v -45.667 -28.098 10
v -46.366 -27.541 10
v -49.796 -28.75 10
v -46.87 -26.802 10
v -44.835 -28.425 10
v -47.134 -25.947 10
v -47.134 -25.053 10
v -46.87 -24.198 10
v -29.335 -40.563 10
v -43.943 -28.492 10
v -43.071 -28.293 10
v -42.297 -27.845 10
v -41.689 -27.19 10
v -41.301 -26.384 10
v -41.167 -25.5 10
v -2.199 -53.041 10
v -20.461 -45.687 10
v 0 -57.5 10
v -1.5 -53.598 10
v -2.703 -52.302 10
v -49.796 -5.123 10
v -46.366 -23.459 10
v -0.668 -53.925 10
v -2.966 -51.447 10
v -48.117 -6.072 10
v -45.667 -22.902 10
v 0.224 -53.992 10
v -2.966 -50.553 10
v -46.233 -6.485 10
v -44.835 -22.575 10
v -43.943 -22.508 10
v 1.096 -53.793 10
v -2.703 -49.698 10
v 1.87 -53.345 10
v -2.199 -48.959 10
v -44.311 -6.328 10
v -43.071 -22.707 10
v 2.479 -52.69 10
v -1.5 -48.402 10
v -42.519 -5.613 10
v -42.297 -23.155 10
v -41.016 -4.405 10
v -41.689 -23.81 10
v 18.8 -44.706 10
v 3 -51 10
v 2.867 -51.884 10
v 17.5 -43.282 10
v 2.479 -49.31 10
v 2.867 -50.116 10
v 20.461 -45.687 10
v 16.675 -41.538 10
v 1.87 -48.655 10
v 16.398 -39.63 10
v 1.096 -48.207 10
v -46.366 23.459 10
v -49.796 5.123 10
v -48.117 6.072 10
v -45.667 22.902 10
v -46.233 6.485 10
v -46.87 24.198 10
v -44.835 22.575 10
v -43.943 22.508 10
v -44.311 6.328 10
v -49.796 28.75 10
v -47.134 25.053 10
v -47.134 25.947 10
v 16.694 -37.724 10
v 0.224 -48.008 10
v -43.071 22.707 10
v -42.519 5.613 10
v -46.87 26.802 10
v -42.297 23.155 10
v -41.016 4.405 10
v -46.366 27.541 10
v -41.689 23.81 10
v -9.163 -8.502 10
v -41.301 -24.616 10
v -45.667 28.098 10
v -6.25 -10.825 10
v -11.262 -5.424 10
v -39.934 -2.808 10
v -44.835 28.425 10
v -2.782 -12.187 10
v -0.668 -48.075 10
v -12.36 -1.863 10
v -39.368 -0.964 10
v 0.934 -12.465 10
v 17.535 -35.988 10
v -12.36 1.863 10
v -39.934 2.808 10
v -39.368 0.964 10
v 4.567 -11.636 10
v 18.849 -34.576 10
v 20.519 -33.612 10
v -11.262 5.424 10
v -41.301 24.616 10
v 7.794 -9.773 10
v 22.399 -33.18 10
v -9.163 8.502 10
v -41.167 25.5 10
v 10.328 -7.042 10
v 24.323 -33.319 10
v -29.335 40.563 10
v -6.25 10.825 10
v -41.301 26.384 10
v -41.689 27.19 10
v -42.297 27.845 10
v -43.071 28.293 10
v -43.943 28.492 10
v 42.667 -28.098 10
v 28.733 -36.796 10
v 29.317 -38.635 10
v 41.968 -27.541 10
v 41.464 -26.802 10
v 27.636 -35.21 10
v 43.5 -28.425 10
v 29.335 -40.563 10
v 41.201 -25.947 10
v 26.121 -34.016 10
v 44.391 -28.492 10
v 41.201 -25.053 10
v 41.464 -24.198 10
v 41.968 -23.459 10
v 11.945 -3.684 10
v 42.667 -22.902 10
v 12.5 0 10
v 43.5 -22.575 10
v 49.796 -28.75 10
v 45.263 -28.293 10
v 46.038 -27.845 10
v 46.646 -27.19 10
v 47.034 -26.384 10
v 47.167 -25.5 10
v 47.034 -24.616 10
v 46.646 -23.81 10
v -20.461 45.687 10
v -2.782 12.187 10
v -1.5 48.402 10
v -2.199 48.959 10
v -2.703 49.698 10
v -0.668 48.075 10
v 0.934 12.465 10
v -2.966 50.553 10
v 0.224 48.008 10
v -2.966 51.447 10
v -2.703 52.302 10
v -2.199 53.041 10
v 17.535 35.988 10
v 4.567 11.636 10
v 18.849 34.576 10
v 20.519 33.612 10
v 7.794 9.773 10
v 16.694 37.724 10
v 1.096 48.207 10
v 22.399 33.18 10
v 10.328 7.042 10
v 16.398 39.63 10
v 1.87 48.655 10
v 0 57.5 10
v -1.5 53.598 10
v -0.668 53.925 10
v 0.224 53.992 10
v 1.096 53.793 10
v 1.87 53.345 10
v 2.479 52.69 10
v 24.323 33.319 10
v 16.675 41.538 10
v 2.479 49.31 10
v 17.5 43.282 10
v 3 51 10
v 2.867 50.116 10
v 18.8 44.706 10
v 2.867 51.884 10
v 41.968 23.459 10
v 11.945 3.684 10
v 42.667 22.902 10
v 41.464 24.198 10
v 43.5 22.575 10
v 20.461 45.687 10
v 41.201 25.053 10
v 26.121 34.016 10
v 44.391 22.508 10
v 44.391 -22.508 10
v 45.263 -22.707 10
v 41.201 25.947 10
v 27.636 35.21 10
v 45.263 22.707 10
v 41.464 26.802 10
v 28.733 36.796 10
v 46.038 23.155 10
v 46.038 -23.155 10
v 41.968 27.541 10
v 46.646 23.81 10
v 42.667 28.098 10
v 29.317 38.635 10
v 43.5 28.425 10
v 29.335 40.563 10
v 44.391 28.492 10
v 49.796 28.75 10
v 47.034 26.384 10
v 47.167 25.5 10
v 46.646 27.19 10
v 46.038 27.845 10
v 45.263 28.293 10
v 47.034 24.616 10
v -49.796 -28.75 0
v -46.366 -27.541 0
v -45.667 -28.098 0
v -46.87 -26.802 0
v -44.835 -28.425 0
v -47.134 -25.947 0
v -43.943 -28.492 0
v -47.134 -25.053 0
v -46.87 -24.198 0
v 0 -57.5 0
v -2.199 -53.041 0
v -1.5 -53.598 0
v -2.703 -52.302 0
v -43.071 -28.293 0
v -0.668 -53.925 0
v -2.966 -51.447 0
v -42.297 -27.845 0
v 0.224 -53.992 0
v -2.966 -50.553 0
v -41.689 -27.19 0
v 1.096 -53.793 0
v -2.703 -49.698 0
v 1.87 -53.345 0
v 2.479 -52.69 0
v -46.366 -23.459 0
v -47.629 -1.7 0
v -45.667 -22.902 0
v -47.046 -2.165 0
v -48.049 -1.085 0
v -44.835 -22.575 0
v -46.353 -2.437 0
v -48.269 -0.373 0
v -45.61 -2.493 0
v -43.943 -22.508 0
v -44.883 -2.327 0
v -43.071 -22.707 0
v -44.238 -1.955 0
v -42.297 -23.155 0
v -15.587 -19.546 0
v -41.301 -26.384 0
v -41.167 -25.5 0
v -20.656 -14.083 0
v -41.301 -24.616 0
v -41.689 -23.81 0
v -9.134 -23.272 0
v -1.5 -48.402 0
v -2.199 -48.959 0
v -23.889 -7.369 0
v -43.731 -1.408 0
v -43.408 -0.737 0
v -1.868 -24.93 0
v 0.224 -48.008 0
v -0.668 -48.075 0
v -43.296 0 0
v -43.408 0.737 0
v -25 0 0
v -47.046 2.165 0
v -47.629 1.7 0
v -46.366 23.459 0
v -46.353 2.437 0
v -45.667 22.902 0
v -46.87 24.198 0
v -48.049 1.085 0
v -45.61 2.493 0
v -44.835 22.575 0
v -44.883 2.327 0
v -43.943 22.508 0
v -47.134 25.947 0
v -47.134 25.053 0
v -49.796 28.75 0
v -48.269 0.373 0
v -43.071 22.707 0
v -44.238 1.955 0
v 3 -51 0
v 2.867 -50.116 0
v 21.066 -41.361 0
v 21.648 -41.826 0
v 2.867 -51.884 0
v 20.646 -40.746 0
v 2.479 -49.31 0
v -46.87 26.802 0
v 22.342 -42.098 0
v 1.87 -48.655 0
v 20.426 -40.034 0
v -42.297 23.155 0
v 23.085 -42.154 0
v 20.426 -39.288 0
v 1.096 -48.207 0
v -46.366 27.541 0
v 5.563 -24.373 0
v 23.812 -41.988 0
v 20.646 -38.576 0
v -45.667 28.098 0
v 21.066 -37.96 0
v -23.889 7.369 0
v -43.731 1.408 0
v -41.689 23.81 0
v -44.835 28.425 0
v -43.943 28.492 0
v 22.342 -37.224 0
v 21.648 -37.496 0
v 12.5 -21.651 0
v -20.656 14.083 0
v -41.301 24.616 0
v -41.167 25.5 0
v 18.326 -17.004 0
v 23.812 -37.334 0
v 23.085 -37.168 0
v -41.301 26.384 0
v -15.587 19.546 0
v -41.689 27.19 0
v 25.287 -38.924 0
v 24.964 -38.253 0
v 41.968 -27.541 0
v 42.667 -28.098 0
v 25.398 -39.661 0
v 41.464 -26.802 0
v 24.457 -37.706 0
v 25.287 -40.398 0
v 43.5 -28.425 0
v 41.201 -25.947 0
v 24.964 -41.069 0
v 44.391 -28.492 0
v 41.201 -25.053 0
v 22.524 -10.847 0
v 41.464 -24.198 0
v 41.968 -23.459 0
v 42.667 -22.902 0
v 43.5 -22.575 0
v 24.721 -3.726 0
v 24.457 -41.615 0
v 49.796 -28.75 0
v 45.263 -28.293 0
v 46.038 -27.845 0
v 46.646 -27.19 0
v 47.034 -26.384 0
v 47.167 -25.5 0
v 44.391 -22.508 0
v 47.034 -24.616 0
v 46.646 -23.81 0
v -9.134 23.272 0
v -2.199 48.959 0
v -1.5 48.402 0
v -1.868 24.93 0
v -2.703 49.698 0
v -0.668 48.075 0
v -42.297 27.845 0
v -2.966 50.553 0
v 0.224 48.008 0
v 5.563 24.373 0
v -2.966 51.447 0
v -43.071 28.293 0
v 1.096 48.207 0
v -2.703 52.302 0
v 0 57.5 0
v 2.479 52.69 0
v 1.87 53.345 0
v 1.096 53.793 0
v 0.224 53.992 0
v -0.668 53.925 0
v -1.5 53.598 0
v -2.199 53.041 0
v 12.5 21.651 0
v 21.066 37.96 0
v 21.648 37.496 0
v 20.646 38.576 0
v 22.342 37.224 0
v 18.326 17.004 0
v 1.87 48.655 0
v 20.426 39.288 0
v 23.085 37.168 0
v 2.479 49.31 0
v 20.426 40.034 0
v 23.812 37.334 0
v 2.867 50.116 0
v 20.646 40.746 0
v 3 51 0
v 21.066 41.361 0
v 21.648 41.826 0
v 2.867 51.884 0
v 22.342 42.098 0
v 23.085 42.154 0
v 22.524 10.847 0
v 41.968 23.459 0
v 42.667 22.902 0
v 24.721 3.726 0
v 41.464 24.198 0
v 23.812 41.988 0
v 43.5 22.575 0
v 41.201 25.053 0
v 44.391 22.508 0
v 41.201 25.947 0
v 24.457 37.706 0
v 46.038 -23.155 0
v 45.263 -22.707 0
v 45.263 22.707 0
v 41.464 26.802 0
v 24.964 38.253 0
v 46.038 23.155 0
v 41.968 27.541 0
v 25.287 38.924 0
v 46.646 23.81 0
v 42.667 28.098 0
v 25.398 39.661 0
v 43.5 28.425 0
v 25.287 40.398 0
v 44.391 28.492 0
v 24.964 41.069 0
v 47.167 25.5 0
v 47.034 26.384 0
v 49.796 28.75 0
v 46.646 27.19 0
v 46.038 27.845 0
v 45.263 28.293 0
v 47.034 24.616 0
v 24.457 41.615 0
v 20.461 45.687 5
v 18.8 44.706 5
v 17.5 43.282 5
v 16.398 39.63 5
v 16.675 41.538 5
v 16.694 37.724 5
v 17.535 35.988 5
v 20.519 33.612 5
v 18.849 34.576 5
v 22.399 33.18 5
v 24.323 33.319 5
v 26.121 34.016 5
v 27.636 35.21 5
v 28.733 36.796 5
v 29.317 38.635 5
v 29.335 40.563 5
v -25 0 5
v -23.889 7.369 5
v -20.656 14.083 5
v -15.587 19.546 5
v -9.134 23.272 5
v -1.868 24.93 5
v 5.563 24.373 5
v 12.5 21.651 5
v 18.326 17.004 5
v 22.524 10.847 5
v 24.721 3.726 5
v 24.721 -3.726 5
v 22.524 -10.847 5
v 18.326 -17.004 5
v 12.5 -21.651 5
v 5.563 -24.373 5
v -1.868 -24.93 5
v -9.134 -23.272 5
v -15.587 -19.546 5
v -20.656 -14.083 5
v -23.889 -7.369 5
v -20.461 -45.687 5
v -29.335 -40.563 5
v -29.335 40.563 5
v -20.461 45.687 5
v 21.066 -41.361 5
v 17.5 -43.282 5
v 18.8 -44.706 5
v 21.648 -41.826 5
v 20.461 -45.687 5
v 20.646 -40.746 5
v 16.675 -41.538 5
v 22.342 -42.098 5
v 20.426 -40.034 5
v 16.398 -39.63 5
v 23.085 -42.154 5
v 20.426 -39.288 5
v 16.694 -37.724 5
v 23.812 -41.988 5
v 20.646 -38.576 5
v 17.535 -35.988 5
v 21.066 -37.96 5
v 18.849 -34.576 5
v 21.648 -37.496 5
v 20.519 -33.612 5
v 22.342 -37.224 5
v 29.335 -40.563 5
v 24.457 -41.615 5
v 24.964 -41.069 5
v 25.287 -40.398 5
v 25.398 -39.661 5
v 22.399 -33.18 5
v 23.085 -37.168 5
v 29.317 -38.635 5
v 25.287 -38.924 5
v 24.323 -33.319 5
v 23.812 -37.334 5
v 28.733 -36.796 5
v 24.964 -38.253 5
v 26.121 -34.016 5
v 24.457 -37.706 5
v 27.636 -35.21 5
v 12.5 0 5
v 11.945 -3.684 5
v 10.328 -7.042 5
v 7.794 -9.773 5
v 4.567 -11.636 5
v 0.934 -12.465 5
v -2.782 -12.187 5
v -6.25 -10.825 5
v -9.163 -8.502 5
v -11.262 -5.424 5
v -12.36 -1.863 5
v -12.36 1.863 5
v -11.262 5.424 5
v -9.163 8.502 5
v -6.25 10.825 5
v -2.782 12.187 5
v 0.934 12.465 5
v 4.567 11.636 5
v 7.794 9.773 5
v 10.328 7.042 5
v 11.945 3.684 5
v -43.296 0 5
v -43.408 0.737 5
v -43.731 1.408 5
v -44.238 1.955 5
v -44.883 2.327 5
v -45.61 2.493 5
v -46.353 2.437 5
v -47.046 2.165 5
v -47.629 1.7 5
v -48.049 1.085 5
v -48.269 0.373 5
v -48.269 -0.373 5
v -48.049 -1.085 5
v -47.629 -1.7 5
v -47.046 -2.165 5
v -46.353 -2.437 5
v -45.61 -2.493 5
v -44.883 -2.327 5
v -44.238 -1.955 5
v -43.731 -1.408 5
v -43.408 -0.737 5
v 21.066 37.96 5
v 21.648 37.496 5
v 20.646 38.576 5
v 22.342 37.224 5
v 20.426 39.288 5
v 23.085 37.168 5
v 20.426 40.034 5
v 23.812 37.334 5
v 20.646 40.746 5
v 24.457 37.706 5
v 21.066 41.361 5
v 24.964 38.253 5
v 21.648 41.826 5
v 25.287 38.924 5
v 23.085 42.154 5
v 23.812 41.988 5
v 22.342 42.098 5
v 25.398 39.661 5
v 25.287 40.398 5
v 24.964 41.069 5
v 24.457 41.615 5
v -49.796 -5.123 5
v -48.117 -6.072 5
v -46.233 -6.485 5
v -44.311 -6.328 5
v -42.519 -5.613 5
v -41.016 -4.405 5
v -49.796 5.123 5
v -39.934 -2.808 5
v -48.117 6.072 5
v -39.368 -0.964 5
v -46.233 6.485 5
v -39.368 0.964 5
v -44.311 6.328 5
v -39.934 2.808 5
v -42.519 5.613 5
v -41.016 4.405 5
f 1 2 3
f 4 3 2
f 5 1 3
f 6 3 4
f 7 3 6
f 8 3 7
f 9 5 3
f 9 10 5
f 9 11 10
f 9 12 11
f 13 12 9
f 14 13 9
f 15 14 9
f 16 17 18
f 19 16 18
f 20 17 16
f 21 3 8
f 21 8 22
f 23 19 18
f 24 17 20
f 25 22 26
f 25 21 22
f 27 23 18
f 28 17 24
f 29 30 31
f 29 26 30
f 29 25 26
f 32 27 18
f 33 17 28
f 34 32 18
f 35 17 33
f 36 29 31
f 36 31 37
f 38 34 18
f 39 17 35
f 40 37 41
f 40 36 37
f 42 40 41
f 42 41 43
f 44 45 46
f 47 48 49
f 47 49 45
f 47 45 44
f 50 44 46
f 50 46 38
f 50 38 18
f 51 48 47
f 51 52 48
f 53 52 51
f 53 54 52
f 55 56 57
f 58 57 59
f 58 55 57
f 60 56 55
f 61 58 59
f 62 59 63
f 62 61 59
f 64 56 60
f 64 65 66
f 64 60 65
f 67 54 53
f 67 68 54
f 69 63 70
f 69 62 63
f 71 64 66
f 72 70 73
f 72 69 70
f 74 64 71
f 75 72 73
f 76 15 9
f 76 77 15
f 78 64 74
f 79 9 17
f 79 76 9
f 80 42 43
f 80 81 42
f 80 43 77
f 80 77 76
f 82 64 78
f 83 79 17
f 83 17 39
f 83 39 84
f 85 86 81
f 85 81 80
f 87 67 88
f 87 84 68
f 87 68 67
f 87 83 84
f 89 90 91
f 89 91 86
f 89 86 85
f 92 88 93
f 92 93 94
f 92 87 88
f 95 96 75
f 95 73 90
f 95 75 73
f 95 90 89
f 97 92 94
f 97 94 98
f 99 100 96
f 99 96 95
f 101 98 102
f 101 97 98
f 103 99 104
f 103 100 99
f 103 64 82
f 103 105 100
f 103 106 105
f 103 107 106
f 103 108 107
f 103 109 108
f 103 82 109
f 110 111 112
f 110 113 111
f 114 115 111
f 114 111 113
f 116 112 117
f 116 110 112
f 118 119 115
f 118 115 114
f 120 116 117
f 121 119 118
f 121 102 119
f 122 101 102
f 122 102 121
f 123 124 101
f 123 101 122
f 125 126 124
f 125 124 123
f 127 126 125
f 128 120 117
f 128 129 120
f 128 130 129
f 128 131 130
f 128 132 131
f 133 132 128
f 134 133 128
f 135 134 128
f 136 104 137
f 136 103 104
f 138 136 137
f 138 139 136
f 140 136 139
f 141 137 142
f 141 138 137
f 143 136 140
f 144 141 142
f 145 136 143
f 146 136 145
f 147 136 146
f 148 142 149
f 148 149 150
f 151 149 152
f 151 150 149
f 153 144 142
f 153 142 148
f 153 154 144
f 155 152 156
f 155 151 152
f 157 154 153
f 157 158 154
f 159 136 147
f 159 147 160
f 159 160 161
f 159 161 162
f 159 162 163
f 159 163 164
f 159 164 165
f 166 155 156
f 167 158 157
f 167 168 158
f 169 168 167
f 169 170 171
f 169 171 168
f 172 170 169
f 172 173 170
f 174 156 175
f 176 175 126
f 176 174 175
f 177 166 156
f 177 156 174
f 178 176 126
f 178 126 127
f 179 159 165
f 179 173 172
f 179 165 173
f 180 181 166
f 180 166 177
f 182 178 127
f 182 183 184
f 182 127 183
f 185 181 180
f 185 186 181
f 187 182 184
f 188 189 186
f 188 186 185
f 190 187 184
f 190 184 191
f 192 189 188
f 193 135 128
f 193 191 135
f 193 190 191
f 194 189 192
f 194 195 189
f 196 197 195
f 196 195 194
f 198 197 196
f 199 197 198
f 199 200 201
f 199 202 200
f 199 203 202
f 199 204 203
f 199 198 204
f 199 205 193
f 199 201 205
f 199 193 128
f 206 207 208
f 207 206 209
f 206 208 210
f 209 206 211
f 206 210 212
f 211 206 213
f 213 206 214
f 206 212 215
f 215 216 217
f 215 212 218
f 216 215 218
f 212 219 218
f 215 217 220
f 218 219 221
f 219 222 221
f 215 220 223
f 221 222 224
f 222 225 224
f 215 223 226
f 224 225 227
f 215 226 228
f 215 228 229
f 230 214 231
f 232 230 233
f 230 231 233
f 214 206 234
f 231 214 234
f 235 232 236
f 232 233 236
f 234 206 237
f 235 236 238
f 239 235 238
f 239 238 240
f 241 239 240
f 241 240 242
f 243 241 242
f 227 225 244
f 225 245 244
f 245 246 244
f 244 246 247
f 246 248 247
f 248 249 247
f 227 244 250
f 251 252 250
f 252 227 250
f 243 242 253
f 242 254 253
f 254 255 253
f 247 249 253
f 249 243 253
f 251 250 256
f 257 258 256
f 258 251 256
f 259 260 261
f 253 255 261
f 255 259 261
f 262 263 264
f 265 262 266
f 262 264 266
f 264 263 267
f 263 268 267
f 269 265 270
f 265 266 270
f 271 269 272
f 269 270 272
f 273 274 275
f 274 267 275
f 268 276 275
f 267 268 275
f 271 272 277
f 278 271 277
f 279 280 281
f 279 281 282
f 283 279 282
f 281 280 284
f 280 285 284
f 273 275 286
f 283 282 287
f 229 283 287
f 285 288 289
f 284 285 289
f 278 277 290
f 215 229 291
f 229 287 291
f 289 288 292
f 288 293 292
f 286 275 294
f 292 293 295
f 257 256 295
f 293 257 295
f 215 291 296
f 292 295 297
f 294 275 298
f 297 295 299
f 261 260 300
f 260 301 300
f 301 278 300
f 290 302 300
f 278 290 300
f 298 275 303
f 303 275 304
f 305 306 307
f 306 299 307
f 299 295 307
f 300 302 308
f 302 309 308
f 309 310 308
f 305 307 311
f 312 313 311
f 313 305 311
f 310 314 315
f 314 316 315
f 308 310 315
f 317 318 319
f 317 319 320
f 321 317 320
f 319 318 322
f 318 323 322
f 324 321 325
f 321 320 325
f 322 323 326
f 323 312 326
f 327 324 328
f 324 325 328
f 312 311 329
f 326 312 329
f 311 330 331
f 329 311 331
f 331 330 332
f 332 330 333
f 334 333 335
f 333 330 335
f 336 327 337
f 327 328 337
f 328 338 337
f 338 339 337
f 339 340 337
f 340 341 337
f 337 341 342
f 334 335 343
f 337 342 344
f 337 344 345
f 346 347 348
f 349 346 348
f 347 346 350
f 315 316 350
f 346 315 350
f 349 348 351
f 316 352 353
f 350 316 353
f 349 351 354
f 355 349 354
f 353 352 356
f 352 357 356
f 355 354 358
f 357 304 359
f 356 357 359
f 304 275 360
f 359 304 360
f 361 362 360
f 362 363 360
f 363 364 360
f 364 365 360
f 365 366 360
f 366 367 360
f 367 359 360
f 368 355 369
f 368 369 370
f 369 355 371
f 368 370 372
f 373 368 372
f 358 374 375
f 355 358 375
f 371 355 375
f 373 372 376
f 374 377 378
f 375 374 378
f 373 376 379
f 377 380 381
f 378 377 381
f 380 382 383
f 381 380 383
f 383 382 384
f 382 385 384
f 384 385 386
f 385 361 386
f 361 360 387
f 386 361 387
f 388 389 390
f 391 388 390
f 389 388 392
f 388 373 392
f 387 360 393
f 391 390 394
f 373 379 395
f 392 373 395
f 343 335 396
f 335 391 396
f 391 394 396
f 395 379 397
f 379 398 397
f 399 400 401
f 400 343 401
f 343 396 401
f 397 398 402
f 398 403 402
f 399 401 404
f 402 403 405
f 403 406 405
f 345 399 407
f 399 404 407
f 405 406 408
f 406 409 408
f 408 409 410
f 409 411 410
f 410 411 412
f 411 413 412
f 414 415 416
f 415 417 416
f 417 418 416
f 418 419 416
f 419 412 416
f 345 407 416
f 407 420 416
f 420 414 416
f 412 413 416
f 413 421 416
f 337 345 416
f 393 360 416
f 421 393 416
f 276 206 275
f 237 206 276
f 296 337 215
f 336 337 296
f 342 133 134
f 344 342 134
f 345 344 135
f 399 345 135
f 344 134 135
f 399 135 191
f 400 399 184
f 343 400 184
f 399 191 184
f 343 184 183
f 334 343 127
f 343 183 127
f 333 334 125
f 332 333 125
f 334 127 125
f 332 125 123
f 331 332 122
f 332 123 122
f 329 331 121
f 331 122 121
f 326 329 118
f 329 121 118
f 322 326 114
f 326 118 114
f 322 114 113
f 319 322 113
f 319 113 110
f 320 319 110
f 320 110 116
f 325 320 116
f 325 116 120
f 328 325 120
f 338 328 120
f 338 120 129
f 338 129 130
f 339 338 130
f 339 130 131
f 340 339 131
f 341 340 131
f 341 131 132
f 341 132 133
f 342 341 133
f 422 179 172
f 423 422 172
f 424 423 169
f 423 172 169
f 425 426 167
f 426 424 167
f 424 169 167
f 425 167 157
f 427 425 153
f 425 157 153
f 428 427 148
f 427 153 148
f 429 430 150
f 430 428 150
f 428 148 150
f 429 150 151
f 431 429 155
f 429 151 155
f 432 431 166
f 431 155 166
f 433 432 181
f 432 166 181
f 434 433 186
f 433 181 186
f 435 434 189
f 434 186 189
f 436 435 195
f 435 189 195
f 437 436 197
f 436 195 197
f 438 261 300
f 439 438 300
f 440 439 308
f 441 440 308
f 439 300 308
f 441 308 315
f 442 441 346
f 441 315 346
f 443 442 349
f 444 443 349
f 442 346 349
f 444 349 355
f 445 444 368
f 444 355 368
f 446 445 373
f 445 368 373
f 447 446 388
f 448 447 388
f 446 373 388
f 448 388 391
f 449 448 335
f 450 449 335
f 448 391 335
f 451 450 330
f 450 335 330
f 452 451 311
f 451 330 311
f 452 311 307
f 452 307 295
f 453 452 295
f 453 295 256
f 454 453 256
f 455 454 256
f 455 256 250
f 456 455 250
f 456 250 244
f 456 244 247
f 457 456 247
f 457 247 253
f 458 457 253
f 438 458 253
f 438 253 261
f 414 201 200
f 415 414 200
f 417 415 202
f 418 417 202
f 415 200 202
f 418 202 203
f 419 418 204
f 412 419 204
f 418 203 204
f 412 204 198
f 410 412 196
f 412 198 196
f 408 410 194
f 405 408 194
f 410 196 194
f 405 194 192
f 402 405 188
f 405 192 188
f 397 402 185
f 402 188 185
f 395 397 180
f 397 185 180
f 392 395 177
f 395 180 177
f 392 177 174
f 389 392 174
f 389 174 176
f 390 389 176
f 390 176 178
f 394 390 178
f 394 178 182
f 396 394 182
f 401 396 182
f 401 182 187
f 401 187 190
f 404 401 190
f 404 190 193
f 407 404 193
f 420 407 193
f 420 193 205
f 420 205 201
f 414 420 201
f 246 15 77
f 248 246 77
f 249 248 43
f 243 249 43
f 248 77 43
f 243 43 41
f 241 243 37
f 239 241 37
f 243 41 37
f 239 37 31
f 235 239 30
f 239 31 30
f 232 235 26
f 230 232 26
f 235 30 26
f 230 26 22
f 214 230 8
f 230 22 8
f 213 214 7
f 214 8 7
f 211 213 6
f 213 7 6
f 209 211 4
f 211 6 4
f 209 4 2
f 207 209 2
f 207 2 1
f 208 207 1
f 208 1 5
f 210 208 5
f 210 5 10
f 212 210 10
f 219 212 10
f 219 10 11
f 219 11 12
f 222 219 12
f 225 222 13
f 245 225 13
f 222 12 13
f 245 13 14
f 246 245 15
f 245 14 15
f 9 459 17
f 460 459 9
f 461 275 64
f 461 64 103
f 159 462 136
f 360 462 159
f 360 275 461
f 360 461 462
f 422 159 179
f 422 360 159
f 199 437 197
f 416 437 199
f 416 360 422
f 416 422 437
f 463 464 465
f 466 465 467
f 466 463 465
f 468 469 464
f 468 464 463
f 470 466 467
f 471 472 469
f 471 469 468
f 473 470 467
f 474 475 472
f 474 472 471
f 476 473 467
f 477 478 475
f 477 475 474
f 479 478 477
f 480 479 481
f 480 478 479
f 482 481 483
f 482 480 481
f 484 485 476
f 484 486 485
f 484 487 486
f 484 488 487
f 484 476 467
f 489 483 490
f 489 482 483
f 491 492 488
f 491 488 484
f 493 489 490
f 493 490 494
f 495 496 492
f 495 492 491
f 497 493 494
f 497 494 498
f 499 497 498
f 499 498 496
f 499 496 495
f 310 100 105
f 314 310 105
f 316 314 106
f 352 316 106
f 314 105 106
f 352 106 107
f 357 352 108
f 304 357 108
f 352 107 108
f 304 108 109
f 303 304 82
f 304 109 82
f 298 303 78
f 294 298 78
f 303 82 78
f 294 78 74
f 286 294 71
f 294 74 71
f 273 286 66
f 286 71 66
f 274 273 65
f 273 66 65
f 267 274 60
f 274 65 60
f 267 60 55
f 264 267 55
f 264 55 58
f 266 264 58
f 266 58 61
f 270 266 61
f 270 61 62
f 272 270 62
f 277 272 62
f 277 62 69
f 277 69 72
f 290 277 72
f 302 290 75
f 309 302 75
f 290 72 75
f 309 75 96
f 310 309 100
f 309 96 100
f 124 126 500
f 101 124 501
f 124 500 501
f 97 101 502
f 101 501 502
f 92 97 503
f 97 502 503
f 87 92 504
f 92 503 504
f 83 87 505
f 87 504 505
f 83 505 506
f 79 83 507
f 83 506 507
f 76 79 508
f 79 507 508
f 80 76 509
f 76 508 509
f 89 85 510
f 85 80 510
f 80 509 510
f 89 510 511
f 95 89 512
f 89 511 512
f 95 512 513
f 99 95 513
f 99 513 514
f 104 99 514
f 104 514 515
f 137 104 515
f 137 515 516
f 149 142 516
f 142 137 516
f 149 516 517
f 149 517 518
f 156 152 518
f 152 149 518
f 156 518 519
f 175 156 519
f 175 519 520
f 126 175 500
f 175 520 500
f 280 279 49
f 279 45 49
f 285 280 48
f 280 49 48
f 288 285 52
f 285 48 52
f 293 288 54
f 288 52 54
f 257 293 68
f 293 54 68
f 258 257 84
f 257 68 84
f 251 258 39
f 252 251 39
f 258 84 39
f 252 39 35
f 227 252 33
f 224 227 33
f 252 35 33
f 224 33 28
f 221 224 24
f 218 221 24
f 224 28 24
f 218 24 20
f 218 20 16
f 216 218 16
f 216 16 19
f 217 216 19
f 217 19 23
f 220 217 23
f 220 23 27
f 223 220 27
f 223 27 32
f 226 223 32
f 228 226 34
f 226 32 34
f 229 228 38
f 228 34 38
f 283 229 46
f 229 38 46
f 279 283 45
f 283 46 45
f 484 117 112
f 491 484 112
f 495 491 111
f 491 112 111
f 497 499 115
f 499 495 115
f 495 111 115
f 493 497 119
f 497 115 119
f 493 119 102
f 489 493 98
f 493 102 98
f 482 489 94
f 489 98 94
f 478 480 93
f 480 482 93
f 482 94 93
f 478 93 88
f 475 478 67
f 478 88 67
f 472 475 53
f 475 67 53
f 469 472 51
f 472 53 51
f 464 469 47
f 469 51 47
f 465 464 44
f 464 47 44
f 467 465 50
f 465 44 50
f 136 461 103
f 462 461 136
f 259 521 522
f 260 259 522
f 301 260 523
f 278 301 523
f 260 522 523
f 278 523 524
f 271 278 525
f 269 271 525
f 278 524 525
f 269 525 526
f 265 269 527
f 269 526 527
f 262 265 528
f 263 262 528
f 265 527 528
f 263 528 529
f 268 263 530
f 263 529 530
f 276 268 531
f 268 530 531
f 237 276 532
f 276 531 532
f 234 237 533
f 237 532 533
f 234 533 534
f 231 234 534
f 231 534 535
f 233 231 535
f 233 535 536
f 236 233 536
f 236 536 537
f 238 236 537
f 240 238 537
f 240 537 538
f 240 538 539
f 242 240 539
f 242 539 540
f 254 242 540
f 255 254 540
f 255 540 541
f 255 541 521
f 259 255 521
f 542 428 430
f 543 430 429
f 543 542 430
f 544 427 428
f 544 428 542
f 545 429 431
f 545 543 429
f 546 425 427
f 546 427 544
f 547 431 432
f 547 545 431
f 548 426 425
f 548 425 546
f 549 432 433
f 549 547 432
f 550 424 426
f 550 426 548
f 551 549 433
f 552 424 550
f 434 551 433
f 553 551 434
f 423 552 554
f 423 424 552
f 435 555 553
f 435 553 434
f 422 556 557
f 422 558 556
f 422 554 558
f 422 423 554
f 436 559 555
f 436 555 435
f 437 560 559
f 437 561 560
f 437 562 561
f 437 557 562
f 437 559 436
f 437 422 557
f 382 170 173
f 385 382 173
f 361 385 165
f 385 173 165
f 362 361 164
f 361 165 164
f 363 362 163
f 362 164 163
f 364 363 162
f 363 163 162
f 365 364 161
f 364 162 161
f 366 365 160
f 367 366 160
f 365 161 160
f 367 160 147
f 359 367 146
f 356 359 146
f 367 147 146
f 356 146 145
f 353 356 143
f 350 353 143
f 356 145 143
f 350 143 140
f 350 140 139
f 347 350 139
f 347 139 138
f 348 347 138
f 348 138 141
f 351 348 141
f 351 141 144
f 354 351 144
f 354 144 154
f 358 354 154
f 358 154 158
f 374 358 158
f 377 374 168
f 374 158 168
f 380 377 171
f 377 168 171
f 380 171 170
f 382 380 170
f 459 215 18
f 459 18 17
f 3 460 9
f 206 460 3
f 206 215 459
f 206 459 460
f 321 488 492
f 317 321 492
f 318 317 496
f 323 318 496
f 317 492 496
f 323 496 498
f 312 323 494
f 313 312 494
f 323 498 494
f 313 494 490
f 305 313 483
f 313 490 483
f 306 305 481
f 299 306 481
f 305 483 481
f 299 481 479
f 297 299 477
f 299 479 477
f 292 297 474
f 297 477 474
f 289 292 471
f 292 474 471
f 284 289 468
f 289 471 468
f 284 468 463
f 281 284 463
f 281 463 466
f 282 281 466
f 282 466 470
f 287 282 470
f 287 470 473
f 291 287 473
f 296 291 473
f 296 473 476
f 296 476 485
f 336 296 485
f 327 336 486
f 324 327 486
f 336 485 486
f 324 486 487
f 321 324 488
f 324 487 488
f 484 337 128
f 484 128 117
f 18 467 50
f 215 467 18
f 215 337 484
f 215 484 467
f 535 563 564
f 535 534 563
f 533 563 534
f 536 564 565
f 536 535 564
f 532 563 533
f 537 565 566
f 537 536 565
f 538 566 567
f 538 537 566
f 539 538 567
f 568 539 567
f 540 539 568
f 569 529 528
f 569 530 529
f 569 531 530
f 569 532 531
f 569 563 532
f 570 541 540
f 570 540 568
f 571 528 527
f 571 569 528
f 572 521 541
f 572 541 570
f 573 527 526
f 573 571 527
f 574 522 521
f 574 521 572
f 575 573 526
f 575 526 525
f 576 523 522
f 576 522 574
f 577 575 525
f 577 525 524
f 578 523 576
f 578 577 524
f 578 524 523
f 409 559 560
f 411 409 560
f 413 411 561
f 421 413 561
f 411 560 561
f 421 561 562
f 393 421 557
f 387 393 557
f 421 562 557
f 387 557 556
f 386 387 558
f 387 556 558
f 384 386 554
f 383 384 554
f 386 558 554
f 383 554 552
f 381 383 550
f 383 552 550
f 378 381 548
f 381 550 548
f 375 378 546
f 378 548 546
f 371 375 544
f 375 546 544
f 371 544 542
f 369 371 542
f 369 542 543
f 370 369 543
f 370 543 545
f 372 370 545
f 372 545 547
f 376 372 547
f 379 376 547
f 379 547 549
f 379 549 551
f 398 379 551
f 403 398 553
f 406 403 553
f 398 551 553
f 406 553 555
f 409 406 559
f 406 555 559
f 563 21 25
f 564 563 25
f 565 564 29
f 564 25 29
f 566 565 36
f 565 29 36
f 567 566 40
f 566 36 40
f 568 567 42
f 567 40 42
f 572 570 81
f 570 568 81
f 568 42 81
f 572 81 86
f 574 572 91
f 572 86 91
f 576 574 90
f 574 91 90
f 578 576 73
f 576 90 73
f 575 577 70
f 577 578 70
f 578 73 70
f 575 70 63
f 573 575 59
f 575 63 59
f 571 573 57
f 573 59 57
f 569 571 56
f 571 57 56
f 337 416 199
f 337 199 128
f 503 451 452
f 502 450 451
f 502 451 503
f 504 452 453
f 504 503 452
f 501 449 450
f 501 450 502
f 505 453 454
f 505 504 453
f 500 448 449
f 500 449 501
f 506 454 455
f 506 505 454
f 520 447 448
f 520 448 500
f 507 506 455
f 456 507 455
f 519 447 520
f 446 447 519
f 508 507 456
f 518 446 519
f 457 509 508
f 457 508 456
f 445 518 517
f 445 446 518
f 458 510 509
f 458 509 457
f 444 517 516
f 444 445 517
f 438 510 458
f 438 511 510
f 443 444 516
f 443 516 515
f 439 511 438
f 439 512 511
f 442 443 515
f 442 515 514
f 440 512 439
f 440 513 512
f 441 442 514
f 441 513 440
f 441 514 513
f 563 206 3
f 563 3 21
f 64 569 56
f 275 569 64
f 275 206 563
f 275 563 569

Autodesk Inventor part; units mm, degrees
ref_plane "YZ Plane" through (0, 0, 0) normal (1, 0, 0) x (0, 1, 0)
ref_plane "XZ Plane" through (0, 0, 0) normal (0, 1, 0) x (-1, 0, 0)
ref_plane "XY Plane" through (0, 0, 0) normal (0, 0, 1) x (1, 0, 0)
sketch "Sketch1" plane through (0, 0, 0) normal (0, 0, 1) x (1, 0, 0)
  circle A0 centre (0, 0) radius 12.5
  circle A1 centre (-30, 0) radius 3
  circle A2 centre (-15, -25.9808) radius 3
  circle A3 centre (15, -25.9808) radius 3
  circle A4 centre (30, 0) radius 3
  circle A5 centre (15, 25.9808) radius 3
  circle A6 centre (-15, 25.9808) radius 3
  line L0 (0, 57.5) -> (49.7965, 28.75)
  line L1 (49.7965, 28.75) -> (49.7965, -28.75)
  line L2 (49.7965, -28.75) -> (0, -57.5)
  line L3 (0, -57.5) -> (-49.7965, -28.75)
  line L4 (-49.7965, -28.75) -> (-49.7965, 28.75)
  line L5 (-49.7965, 28.75) -> (0, 57.5)
  point P0 (49.7965, 0)
  dimension "d0" = 25
  dimension "d2" = 6
  dimension "d6" = 360
  dimension "d15" = 30
  dimension "d33" = 115
extrude "Extrusion1" add sketch "Sketch1" along normal blind 10 contours A1 | A2 | A3 | A4 | A5 | A6 | L0 L1 L2 L3 L4 L5
sketch "Sketch7" plane through (0, 0, 10) normal (0, 0, 1) x (1, 0, 0)
  circle A0 centre (0, 51) radius 3
  circle A1 centre (-44.1673, 25.5) radius 3
  circle A2 centre (-44.1673, -25.5) radius 3
  circle A3 centre (0, -51) radius 3
  circle A4 centre (44.1673, -25.5) radius 3
  circle A5 centre (44.1673, 25.5) radius 3
  line L0 (0, 51) -> (0, -51)
  point P0 (0, 0)
  dimension "d42" = 6
  dimension "d46" = 360
  dimension "d96" = 102
extrude "Extrusion6" cut sketch "Sketch7" against normal through all
sketch "Sketch9" plane through (0, 0, 0) normal (0, 0, -1) x (-1, 0, 0)
  circle A0 centre (0, 0) radius 25
  dimension "d56" = 50
extrude "Extrusion8" cut sketch "Sketch9" against normal blind 5
sketch "Sketch14" plane through (0, 0, 10) normal (0, 0, 1) x (1, 0, 0)
  circle A0 centre (-45.7965, 0) radius 2.5
  circle A1 centre (-22.8982, -39.6609) radius 2.5
  circle A2 centre (22.8982, -39.6609) radius 2.5
  circle A3 centre (45.7965, 0) radius 2.5
  circle A4 centre (22.8982, 39.6609) radius 2.5
  circle A5 centre (-22.8982, 39.6609) radius 2.5
  line L0 (-49.7965, 28.75) -> (-49.7965, -28.75) projected
  point P0 (0, 0)
  point P1 (-45.7965, 0)
  dimension "d81" = 5
  dimension "d85" = 360
  dimension "d97" = 4
extrude "Extrusion13" cut sketch "Sketch14" against normal through all
sketch "Sketch15" plane through (0, 0, 10) normal (0, 0, 1) x (1, 0, 0)
  circle A0 centre (-22.8982, 39.6609) radius 2.5 projected
  circle A1 centre (-22.8982, 39.6609) radius 6.5
  circle A2 centre (-45.7965, 0) radius 6.5
  circle A3 centre (-22.8982, -39.6609) radius 6.5
  circle A4 centre (22.8982, -39.6609) radius 6.5
  circle A5 centre (45.7965, 0) radius 6.5
  circle A6 centre (22.8982, 39.6609) radius 6.5
  point P0 (0, 0)
  dimension "d89" = 13
  dimension "d92" = 360
extrude "Extrusion14" cut sketch "Sketch15" against normal blind 5 contours A0 | A1 | A2 | A3 | A4 | A5 | A6
sketch "Sketch16" plane through (0, 0, 5) normal (0, 0, 1) x (1, 0, 0)
  line L0 (-29.3353, 40.5633) -> (-20.4612, 45.6867) projected
  arc A0 (-29.3353, 40.5633) -> (-20.4612, 45.6867) centre (-22.8982, 39.6609) ccw projected
  circle A1 centre (-22.8982, 39.6609) radius 2.5 projected
  line L1 (49.7965, 5.1235) -> (49.7965, -5.1235) projected
  arc A2 (49.7965, 5.1235) -> (49.7965, -5.1235) centre (45.7965, 0) ccw projected
  circle A3 centre (45.7965, 0) radius 2.5 projected
  line L2 (-20.4612, -45.6867) -> (-29.3353, -40.5633) projected
  arc A4 (-20.4612, -45.6867) -> (-29.3353, -40.5633) centre (-22.8982, -39.6609) ccw projected
  circle A5 centre (-22.8982, -39.6609) radius 2.5 projected
  point P0 (0, 0)
extrude "Extrusion15" add sketch "Sketch16" along normal blind 5
sketch "Sketch17" plane through (0, 0, 10) normal (0, 0, 1) x (1, 0, 0)
  circle A0 centre (-22.8982, 39.6609) radius 2.5 projected
  circle A1 centre (45.7965, 0) radius 2.5 projected
  circle A2 centre (-22.8982, -39.6609) radius 2.5 projected
  point P0 (0, 0)
extrude "Extrusion16" add sketch "Sketch17" against normal blind 10
properties part number "TA01" material "ABS Plastic"
